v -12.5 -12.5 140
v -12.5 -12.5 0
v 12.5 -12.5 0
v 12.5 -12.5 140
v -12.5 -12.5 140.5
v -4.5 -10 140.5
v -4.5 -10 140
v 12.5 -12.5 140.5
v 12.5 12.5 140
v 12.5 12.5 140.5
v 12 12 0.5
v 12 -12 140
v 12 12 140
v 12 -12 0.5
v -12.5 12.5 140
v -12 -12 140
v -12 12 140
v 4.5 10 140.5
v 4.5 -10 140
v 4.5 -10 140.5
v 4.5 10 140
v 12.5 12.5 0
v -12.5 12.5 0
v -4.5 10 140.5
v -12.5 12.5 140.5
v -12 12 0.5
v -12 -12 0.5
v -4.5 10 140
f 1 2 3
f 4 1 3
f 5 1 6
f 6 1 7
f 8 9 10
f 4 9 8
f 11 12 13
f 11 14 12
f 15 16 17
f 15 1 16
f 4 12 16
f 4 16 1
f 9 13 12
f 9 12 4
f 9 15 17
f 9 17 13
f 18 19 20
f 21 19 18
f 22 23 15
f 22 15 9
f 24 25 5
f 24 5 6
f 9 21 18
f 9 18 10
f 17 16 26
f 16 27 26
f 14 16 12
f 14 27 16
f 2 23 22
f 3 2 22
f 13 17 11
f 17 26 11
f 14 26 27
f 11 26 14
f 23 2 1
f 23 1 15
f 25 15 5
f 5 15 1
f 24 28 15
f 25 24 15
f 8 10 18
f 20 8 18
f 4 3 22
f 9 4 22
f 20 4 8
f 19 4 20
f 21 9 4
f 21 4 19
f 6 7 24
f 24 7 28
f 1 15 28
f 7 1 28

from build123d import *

# Parameters (mm, degrees)
F0_W     = 25
F0_H     = 25
F1_DEPTH = 140
F2_T     = -0.5
F4_DEPTH = 0.5


with BuildPart() as f1:
    # F0 (on Top) → F1 (new body)
    with BuildSketch(Plane.XY):
        Rectangle(F0_W, F0_H)
    extrude(amount=F1_DEPTH)

    # F2
    f2_openings = [f1.faces().sort_by_distance(p)[0] for p in [
        (0, 0, 140),
    ]]
    offset(amount=F2_T, openings=f2_openings)


with BuildPart() as f4:
    # F3 (on face) → F4 (new body)
    with BuildSketch(Plane.XY.offset(140)):
        Polygon((-4.5, 10), (-12.5, 12.5), (-12.5, -12.5), (-4.5, -10), align=None)
    extrude(amount=F4_DEPTH)


with BuildPart() as f5_1:
    # F5: instance of F4
    add(f4.part.mirror(Plane.YZ))


solid = Compound([f1.part, f4.part, f5_1.part])
